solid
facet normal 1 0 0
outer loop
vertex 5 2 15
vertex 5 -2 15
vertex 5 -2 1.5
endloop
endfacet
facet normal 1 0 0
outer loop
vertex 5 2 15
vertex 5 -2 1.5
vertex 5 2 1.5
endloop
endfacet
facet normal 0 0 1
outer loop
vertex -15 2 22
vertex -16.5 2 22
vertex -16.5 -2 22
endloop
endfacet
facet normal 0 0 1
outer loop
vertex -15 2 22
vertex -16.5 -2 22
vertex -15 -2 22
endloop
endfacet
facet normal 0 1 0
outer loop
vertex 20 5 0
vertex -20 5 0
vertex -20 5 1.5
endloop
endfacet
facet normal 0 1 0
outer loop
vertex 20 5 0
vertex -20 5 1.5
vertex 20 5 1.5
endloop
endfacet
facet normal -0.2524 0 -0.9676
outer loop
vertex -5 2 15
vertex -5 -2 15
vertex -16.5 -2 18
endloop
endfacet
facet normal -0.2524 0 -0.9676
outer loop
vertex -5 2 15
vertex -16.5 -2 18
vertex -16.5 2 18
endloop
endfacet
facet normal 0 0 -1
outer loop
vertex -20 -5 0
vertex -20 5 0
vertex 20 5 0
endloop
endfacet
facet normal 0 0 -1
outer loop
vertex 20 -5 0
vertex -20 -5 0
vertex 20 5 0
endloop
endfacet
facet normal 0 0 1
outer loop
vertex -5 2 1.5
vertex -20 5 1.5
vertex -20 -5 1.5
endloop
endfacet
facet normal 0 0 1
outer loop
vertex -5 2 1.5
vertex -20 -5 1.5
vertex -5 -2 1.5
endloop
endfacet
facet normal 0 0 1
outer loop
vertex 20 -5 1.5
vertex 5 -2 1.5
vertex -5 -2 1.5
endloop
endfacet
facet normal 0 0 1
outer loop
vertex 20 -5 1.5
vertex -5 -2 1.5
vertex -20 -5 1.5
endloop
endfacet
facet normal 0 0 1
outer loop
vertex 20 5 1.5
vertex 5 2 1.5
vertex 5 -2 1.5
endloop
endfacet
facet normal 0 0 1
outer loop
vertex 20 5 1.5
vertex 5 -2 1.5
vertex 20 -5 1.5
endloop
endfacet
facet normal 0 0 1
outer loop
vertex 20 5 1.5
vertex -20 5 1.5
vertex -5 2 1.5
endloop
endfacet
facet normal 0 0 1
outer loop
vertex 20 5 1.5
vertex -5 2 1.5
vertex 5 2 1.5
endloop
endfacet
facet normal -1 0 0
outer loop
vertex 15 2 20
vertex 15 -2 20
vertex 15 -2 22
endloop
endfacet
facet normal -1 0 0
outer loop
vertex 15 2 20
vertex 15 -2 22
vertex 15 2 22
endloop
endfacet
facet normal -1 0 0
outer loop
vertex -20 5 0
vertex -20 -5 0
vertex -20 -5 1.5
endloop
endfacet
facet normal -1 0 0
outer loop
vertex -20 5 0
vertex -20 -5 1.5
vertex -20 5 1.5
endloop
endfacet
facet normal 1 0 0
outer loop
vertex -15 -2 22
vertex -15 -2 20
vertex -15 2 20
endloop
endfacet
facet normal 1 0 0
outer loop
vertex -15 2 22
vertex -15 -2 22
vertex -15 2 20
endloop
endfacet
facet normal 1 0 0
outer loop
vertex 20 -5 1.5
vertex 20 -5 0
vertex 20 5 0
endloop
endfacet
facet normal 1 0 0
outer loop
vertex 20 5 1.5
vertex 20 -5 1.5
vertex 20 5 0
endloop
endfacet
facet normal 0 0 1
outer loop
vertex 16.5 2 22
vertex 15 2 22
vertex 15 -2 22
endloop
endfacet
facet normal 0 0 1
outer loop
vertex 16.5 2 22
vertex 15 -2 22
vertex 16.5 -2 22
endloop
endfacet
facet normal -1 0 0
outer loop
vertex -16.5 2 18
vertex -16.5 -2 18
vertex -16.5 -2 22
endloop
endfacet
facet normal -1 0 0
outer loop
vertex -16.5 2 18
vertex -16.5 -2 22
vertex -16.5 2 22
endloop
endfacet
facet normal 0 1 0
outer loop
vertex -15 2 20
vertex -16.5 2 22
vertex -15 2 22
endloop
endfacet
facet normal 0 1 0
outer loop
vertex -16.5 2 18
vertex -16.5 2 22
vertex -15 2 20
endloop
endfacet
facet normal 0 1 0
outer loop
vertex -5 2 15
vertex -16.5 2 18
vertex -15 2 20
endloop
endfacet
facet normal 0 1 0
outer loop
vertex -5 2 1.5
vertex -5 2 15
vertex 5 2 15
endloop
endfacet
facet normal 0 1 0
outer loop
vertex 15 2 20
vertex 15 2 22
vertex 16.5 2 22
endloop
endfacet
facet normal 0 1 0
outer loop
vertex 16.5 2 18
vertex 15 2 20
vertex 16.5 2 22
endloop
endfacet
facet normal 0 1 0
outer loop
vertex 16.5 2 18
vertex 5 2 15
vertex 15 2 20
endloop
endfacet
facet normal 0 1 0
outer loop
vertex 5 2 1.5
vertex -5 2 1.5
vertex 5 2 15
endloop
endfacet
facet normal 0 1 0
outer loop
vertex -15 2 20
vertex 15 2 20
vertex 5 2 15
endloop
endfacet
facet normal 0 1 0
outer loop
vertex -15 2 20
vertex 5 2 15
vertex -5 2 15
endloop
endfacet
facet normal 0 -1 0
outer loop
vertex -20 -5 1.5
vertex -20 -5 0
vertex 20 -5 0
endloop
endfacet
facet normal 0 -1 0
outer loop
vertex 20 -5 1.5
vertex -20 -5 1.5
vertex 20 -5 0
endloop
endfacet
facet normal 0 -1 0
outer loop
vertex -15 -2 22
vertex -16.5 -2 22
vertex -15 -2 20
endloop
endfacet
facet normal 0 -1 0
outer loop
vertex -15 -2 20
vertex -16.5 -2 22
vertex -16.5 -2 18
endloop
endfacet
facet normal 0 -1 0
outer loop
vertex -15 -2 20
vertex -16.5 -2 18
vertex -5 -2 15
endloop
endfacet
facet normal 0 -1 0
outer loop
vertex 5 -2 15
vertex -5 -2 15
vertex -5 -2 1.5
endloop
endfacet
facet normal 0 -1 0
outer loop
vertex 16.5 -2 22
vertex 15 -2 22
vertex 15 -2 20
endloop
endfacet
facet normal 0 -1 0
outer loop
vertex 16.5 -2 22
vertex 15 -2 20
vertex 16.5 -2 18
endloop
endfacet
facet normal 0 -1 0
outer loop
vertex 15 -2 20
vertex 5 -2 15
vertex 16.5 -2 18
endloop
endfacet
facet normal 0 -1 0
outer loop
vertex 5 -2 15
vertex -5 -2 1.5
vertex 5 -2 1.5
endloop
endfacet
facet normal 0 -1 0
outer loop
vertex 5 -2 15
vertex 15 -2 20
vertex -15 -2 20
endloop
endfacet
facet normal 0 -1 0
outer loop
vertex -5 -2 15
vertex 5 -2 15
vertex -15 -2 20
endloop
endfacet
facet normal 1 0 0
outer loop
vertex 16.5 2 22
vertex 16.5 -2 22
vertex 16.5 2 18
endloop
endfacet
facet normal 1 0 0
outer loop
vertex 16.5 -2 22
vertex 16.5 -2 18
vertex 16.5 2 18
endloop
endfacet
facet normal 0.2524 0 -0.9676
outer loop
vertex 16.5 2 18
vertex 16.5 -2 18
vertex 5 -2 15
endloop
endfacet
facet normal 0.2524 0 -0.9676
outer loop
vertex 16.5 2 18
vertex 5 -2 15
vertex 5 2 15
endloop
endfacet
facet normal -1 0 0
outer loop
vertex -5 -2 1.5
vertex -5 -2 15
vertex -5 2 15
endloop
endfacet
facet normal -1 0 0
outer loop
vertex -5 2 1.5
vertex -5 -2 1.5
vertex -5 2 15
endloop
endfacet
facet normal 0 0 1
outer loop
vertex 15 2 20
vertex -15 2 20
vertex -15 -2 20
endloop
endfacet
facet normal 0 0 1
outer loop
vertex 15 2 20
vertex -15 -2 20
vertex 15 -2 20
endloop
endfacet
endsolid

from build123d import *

# Parameters (mm, degrees)
F4_W      = 40
F4_H      = 10
F4_W_2    = 10
F4_H_2    = 4
F5_DEPTH  = 1.5
F6_DEPTH  = 20
F7_W      = 33
F7_H      = 4
F8_DEPTH  = 5
F9_SIZE2  = 2.99999
F9_SIZE   = 11.49999
F10_SIZE2 = 11.49999
F10_SIZE  = 2.99999
F11_W     = 1.5
F11_H     = 4
F12_DEPTH = 2


# Not quite as in the source:
# - a fillet or chamfer is up to 0.001 mm smaller than in the source, because OpenCascade refuses the exact size


with BuildPart() as f5:
    # F4 (on Top) → F5 (new body)
    with BuildSketch(Plane.XY):
        Rectangle(F4_W, F4_H)
        Rectangle(F4_W_2, F4_H_2, mode=Mode.SUBTRACT)
    extrude(amount=F5_DEPTH)

    # F4 (on Top) → F6 (join)
    with BuildSketch(Plane.XY):
        Rectangle(F4_W_2, F4_H_2)
    extrude(amount=F6_DEPTH)

    # F7 (on face) → F8 (join)
    with BuildSketch(Plane.XY.offset(20)):
        Rectangle(F7_W, F7_H)
    extrude(amount=-F8_DEPTH)

    # F9 (size 11.5 and 3 in the source; OpenCascade refuses exactly that, so slightly less here)
    f9_edges = [f5.edges().sort_by_distance(p)[0] for p in [
        (16.5, 0, 15),
    ]]
    f9_side = f5.faces().sort_by_distance((10.75, 0, 15))[0]
    chamfer(f9_edges, length=F9_SIZE, length2=F9_SIZE2, reference=f9_side)

    # F10 (size 3 and 11.5 in the source; OpenCascade refuses exactly that, so slightly less here)
    f10_edges = [f5.edges().sort_by_distance(p)[0] for p in [
        (-16.5, 0, 15),
    ]]
    f10_side = f5.faces().sort_by_distance((-16.5, 0, 17.5))[0]
    chamfer(f10_edges, length=F10_SIZE, length2=F10_SIZE2, reference=f10_side)

    # F11 (on face) → F12 (join)
    with BuildSketch(Plane.XY.offset(20)):
        with Locations((15.75, 0)):
            Rectangle(F11_W, F11_H)
        with Locations((-15.75, 0)):
            Rectangle(F11_W, F11_H)
    extrude(amount=F12_DEPTH)


solid = f5.part
